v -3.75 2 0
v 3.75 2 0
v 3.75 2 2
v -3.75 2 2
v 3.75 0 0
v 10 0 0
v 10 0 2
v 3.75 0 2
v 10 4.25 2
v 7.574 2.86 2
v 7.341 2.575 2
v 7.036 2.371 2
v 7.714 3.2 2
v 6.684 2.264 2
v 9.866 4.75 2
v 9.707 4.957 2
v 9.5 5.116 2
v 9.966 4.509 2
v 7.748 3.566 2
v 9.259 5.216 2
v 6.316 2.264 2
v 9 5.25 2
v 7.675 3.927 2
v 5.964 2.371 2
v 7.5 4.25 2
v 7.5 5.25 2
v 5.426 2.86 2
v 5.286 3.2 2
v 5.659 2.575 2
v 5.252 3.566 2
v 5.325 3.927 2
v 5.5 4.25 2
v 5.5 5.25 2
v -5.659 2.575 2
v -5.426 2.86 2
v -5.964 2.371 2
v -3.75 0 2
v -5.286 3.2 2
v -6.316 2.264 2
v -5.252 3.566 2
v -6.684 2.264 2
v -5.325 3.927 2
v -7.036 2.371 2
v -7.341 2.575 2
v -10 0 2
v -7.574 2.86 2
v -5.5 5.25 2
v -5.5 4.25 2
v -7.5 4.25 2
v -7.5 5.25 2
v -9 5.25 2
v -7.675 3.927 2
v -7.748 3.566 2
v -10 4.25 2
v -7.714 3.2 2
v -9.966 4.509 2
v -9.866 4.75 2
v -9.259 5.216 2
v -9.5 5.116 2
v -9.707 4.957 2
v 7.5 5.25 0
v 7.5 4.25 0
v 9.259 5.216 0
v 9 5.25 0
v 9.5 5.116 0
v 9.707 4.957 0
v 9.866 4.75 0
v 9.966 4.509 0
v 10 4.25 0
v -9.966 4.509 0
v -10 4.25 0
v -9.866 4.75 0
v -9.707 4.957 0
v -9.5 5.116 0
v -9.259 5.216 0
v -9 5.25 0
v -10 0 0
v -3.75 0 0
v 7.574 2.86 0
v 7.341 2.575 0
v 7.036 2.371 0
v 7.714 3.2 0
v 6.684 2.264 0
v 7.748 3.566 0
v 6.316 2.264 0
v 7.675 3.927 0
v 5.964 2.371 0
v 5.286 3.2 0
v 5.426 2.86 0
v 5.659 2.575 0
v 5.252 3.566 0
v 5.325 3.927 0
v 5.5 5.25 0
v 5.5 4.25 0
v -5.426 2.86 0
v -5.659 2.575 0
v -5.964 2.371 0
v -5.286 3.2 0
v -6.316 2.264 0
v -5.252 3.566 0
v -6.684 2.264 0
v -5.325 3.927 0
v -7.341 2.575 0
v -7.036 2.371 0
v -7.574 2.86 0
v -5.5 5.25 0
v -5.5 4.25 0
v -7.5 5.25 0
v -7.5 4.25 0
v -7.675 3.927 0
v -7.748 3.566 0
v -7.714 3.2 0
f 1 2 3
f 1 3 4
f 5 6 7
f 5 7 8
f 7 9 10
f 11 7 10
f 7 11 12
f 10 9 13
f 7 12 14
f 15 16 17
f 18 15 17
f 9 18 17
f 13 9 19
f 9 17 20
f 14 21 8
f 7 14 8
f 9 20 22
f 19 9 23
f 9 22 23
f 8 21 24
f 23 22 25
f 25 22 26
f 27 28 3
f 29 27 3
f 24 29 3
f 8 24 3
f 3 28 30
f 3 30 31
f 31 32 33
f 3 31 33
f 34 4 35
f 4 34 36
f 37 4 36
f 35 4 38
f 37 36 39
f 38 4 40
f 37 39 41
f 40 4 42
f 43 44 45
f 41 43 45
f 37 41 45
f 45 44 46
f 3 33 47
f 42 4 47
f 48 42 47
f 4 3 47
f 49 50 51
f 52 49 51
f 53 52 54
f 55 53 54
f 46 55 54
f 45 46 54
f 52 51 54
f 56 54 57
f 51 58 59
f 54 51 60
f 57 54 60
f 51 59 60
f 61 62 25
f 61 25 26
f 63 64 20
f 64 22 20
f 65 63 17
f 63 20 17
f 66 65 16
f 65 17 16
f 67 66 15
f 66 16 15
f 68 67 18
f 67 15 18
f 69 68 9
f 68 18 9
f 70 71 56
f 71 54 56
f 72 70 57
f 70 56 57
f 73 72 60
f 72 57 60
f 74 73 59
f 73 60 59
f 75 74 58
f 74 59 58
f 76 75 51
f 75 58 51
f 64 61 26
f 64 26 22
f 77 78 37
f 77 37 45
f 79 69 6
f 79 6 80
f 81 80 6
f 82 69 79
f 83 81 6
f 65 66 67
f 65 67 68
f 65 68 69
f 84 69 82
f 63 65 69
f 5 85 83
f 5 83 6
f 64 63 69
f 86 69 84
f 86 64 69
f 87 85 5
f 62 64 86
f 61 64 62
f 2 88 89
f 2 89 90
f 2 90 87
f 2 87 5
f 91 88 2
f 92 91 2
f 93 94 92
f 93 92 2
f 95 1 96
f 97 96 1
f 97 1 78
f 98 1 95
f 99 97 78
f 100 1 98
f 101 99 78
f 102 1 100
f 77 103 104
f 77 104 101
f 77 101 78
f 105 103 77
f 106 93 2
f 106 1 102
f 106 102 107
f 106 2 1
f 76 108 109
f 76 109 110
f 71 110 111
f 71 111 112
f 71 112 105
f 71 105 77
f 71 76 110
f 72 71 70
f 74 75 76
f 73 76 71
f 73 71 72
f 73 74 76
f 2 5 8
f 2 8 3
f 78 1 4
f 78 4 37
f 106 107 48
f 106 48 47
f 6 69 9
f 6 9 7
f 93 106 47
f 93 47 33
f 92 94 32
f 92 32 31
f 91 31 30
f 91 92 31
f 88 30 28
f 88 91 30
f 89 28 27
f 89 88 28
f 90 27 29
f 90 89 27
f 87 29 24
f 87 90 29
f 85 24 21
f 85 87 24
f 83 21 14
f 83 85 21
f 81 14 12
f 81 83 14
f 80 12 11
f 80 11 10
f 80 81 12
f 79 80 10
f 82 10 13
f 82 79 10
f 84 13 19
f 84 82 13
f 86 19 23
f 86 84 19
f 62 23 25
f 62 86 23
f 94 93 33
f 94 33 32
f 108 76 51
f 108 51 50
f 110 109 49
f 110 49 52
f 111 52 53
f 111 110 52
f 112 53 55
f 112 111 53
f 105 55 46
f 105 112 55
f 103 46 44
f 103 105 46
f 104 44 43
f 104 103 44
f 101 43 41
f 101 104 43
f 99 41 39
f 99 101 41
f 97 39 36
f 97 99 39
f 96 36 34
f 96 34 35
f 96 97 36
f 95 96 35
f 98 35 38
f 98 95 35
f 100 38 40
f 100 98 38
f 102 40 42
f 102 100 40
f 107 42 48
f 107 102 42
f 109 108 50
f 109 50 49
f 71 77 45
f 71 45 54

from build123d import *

# Parameters (mm, degrees)
TUBE_PLATE_BODY_DEPTH   = 2
TUBE_PLATE_CONTOURING_R = 1


with BuildPart() as part:
    # Sketch1 → Tube Plate Body (new body)
    with BuildSketch(Plane.XY):
        with BuildLine():
            Line((-10, 0), (-10, 5.25))
            Line((-10, 5.25), (-7.5, 5.25))
            Line((-7.5, 5.25), (-7.5, 4.25))
            ThreePointArc((-7.5, 4.25), (-6.5, 2.25), (-5.5, 4.25))
            Line((-5.5, 4.25), (-5.5, 5.25))
            Line((-5.5, 5.25), (5.5, 5.25))
            Line((5.5, 5.25), (5.5, 4.25))
            ThreePointArc((5.5, 4.25), (6.5, 2.25), (7.5, 4.25))
            Line((7.5, 4.25), (7.5, 5.25))
            Line((7.5, 5.25), (10, 5.25))
            Line((10, 5.25), (10, 0))
            Line((10, 0), (3.75, 0))
            Line((3.75, 0), (3.75, 2))
            Line((3.75, 2), (-3.75, 2))
            Line((-3.75, 2), (-3.75, 0))
            Line((-3.75, 0), (-10, 0))
        make_face()
    extrude(amount=TUBE_PLATE_BODY_DEPTH)

    # Tube Plate Contouring
    tube_plate_contouring_edges = [part.edges().sort_by_distance(p)[0] for p in [
        (-10, 5.25, 1),
        (10, 5.25, 1),
    ]]
    fillet(tube_plate_contouring_edges, radius=TUBE_PLATE_CONTOURING_R)


solid = part.part
